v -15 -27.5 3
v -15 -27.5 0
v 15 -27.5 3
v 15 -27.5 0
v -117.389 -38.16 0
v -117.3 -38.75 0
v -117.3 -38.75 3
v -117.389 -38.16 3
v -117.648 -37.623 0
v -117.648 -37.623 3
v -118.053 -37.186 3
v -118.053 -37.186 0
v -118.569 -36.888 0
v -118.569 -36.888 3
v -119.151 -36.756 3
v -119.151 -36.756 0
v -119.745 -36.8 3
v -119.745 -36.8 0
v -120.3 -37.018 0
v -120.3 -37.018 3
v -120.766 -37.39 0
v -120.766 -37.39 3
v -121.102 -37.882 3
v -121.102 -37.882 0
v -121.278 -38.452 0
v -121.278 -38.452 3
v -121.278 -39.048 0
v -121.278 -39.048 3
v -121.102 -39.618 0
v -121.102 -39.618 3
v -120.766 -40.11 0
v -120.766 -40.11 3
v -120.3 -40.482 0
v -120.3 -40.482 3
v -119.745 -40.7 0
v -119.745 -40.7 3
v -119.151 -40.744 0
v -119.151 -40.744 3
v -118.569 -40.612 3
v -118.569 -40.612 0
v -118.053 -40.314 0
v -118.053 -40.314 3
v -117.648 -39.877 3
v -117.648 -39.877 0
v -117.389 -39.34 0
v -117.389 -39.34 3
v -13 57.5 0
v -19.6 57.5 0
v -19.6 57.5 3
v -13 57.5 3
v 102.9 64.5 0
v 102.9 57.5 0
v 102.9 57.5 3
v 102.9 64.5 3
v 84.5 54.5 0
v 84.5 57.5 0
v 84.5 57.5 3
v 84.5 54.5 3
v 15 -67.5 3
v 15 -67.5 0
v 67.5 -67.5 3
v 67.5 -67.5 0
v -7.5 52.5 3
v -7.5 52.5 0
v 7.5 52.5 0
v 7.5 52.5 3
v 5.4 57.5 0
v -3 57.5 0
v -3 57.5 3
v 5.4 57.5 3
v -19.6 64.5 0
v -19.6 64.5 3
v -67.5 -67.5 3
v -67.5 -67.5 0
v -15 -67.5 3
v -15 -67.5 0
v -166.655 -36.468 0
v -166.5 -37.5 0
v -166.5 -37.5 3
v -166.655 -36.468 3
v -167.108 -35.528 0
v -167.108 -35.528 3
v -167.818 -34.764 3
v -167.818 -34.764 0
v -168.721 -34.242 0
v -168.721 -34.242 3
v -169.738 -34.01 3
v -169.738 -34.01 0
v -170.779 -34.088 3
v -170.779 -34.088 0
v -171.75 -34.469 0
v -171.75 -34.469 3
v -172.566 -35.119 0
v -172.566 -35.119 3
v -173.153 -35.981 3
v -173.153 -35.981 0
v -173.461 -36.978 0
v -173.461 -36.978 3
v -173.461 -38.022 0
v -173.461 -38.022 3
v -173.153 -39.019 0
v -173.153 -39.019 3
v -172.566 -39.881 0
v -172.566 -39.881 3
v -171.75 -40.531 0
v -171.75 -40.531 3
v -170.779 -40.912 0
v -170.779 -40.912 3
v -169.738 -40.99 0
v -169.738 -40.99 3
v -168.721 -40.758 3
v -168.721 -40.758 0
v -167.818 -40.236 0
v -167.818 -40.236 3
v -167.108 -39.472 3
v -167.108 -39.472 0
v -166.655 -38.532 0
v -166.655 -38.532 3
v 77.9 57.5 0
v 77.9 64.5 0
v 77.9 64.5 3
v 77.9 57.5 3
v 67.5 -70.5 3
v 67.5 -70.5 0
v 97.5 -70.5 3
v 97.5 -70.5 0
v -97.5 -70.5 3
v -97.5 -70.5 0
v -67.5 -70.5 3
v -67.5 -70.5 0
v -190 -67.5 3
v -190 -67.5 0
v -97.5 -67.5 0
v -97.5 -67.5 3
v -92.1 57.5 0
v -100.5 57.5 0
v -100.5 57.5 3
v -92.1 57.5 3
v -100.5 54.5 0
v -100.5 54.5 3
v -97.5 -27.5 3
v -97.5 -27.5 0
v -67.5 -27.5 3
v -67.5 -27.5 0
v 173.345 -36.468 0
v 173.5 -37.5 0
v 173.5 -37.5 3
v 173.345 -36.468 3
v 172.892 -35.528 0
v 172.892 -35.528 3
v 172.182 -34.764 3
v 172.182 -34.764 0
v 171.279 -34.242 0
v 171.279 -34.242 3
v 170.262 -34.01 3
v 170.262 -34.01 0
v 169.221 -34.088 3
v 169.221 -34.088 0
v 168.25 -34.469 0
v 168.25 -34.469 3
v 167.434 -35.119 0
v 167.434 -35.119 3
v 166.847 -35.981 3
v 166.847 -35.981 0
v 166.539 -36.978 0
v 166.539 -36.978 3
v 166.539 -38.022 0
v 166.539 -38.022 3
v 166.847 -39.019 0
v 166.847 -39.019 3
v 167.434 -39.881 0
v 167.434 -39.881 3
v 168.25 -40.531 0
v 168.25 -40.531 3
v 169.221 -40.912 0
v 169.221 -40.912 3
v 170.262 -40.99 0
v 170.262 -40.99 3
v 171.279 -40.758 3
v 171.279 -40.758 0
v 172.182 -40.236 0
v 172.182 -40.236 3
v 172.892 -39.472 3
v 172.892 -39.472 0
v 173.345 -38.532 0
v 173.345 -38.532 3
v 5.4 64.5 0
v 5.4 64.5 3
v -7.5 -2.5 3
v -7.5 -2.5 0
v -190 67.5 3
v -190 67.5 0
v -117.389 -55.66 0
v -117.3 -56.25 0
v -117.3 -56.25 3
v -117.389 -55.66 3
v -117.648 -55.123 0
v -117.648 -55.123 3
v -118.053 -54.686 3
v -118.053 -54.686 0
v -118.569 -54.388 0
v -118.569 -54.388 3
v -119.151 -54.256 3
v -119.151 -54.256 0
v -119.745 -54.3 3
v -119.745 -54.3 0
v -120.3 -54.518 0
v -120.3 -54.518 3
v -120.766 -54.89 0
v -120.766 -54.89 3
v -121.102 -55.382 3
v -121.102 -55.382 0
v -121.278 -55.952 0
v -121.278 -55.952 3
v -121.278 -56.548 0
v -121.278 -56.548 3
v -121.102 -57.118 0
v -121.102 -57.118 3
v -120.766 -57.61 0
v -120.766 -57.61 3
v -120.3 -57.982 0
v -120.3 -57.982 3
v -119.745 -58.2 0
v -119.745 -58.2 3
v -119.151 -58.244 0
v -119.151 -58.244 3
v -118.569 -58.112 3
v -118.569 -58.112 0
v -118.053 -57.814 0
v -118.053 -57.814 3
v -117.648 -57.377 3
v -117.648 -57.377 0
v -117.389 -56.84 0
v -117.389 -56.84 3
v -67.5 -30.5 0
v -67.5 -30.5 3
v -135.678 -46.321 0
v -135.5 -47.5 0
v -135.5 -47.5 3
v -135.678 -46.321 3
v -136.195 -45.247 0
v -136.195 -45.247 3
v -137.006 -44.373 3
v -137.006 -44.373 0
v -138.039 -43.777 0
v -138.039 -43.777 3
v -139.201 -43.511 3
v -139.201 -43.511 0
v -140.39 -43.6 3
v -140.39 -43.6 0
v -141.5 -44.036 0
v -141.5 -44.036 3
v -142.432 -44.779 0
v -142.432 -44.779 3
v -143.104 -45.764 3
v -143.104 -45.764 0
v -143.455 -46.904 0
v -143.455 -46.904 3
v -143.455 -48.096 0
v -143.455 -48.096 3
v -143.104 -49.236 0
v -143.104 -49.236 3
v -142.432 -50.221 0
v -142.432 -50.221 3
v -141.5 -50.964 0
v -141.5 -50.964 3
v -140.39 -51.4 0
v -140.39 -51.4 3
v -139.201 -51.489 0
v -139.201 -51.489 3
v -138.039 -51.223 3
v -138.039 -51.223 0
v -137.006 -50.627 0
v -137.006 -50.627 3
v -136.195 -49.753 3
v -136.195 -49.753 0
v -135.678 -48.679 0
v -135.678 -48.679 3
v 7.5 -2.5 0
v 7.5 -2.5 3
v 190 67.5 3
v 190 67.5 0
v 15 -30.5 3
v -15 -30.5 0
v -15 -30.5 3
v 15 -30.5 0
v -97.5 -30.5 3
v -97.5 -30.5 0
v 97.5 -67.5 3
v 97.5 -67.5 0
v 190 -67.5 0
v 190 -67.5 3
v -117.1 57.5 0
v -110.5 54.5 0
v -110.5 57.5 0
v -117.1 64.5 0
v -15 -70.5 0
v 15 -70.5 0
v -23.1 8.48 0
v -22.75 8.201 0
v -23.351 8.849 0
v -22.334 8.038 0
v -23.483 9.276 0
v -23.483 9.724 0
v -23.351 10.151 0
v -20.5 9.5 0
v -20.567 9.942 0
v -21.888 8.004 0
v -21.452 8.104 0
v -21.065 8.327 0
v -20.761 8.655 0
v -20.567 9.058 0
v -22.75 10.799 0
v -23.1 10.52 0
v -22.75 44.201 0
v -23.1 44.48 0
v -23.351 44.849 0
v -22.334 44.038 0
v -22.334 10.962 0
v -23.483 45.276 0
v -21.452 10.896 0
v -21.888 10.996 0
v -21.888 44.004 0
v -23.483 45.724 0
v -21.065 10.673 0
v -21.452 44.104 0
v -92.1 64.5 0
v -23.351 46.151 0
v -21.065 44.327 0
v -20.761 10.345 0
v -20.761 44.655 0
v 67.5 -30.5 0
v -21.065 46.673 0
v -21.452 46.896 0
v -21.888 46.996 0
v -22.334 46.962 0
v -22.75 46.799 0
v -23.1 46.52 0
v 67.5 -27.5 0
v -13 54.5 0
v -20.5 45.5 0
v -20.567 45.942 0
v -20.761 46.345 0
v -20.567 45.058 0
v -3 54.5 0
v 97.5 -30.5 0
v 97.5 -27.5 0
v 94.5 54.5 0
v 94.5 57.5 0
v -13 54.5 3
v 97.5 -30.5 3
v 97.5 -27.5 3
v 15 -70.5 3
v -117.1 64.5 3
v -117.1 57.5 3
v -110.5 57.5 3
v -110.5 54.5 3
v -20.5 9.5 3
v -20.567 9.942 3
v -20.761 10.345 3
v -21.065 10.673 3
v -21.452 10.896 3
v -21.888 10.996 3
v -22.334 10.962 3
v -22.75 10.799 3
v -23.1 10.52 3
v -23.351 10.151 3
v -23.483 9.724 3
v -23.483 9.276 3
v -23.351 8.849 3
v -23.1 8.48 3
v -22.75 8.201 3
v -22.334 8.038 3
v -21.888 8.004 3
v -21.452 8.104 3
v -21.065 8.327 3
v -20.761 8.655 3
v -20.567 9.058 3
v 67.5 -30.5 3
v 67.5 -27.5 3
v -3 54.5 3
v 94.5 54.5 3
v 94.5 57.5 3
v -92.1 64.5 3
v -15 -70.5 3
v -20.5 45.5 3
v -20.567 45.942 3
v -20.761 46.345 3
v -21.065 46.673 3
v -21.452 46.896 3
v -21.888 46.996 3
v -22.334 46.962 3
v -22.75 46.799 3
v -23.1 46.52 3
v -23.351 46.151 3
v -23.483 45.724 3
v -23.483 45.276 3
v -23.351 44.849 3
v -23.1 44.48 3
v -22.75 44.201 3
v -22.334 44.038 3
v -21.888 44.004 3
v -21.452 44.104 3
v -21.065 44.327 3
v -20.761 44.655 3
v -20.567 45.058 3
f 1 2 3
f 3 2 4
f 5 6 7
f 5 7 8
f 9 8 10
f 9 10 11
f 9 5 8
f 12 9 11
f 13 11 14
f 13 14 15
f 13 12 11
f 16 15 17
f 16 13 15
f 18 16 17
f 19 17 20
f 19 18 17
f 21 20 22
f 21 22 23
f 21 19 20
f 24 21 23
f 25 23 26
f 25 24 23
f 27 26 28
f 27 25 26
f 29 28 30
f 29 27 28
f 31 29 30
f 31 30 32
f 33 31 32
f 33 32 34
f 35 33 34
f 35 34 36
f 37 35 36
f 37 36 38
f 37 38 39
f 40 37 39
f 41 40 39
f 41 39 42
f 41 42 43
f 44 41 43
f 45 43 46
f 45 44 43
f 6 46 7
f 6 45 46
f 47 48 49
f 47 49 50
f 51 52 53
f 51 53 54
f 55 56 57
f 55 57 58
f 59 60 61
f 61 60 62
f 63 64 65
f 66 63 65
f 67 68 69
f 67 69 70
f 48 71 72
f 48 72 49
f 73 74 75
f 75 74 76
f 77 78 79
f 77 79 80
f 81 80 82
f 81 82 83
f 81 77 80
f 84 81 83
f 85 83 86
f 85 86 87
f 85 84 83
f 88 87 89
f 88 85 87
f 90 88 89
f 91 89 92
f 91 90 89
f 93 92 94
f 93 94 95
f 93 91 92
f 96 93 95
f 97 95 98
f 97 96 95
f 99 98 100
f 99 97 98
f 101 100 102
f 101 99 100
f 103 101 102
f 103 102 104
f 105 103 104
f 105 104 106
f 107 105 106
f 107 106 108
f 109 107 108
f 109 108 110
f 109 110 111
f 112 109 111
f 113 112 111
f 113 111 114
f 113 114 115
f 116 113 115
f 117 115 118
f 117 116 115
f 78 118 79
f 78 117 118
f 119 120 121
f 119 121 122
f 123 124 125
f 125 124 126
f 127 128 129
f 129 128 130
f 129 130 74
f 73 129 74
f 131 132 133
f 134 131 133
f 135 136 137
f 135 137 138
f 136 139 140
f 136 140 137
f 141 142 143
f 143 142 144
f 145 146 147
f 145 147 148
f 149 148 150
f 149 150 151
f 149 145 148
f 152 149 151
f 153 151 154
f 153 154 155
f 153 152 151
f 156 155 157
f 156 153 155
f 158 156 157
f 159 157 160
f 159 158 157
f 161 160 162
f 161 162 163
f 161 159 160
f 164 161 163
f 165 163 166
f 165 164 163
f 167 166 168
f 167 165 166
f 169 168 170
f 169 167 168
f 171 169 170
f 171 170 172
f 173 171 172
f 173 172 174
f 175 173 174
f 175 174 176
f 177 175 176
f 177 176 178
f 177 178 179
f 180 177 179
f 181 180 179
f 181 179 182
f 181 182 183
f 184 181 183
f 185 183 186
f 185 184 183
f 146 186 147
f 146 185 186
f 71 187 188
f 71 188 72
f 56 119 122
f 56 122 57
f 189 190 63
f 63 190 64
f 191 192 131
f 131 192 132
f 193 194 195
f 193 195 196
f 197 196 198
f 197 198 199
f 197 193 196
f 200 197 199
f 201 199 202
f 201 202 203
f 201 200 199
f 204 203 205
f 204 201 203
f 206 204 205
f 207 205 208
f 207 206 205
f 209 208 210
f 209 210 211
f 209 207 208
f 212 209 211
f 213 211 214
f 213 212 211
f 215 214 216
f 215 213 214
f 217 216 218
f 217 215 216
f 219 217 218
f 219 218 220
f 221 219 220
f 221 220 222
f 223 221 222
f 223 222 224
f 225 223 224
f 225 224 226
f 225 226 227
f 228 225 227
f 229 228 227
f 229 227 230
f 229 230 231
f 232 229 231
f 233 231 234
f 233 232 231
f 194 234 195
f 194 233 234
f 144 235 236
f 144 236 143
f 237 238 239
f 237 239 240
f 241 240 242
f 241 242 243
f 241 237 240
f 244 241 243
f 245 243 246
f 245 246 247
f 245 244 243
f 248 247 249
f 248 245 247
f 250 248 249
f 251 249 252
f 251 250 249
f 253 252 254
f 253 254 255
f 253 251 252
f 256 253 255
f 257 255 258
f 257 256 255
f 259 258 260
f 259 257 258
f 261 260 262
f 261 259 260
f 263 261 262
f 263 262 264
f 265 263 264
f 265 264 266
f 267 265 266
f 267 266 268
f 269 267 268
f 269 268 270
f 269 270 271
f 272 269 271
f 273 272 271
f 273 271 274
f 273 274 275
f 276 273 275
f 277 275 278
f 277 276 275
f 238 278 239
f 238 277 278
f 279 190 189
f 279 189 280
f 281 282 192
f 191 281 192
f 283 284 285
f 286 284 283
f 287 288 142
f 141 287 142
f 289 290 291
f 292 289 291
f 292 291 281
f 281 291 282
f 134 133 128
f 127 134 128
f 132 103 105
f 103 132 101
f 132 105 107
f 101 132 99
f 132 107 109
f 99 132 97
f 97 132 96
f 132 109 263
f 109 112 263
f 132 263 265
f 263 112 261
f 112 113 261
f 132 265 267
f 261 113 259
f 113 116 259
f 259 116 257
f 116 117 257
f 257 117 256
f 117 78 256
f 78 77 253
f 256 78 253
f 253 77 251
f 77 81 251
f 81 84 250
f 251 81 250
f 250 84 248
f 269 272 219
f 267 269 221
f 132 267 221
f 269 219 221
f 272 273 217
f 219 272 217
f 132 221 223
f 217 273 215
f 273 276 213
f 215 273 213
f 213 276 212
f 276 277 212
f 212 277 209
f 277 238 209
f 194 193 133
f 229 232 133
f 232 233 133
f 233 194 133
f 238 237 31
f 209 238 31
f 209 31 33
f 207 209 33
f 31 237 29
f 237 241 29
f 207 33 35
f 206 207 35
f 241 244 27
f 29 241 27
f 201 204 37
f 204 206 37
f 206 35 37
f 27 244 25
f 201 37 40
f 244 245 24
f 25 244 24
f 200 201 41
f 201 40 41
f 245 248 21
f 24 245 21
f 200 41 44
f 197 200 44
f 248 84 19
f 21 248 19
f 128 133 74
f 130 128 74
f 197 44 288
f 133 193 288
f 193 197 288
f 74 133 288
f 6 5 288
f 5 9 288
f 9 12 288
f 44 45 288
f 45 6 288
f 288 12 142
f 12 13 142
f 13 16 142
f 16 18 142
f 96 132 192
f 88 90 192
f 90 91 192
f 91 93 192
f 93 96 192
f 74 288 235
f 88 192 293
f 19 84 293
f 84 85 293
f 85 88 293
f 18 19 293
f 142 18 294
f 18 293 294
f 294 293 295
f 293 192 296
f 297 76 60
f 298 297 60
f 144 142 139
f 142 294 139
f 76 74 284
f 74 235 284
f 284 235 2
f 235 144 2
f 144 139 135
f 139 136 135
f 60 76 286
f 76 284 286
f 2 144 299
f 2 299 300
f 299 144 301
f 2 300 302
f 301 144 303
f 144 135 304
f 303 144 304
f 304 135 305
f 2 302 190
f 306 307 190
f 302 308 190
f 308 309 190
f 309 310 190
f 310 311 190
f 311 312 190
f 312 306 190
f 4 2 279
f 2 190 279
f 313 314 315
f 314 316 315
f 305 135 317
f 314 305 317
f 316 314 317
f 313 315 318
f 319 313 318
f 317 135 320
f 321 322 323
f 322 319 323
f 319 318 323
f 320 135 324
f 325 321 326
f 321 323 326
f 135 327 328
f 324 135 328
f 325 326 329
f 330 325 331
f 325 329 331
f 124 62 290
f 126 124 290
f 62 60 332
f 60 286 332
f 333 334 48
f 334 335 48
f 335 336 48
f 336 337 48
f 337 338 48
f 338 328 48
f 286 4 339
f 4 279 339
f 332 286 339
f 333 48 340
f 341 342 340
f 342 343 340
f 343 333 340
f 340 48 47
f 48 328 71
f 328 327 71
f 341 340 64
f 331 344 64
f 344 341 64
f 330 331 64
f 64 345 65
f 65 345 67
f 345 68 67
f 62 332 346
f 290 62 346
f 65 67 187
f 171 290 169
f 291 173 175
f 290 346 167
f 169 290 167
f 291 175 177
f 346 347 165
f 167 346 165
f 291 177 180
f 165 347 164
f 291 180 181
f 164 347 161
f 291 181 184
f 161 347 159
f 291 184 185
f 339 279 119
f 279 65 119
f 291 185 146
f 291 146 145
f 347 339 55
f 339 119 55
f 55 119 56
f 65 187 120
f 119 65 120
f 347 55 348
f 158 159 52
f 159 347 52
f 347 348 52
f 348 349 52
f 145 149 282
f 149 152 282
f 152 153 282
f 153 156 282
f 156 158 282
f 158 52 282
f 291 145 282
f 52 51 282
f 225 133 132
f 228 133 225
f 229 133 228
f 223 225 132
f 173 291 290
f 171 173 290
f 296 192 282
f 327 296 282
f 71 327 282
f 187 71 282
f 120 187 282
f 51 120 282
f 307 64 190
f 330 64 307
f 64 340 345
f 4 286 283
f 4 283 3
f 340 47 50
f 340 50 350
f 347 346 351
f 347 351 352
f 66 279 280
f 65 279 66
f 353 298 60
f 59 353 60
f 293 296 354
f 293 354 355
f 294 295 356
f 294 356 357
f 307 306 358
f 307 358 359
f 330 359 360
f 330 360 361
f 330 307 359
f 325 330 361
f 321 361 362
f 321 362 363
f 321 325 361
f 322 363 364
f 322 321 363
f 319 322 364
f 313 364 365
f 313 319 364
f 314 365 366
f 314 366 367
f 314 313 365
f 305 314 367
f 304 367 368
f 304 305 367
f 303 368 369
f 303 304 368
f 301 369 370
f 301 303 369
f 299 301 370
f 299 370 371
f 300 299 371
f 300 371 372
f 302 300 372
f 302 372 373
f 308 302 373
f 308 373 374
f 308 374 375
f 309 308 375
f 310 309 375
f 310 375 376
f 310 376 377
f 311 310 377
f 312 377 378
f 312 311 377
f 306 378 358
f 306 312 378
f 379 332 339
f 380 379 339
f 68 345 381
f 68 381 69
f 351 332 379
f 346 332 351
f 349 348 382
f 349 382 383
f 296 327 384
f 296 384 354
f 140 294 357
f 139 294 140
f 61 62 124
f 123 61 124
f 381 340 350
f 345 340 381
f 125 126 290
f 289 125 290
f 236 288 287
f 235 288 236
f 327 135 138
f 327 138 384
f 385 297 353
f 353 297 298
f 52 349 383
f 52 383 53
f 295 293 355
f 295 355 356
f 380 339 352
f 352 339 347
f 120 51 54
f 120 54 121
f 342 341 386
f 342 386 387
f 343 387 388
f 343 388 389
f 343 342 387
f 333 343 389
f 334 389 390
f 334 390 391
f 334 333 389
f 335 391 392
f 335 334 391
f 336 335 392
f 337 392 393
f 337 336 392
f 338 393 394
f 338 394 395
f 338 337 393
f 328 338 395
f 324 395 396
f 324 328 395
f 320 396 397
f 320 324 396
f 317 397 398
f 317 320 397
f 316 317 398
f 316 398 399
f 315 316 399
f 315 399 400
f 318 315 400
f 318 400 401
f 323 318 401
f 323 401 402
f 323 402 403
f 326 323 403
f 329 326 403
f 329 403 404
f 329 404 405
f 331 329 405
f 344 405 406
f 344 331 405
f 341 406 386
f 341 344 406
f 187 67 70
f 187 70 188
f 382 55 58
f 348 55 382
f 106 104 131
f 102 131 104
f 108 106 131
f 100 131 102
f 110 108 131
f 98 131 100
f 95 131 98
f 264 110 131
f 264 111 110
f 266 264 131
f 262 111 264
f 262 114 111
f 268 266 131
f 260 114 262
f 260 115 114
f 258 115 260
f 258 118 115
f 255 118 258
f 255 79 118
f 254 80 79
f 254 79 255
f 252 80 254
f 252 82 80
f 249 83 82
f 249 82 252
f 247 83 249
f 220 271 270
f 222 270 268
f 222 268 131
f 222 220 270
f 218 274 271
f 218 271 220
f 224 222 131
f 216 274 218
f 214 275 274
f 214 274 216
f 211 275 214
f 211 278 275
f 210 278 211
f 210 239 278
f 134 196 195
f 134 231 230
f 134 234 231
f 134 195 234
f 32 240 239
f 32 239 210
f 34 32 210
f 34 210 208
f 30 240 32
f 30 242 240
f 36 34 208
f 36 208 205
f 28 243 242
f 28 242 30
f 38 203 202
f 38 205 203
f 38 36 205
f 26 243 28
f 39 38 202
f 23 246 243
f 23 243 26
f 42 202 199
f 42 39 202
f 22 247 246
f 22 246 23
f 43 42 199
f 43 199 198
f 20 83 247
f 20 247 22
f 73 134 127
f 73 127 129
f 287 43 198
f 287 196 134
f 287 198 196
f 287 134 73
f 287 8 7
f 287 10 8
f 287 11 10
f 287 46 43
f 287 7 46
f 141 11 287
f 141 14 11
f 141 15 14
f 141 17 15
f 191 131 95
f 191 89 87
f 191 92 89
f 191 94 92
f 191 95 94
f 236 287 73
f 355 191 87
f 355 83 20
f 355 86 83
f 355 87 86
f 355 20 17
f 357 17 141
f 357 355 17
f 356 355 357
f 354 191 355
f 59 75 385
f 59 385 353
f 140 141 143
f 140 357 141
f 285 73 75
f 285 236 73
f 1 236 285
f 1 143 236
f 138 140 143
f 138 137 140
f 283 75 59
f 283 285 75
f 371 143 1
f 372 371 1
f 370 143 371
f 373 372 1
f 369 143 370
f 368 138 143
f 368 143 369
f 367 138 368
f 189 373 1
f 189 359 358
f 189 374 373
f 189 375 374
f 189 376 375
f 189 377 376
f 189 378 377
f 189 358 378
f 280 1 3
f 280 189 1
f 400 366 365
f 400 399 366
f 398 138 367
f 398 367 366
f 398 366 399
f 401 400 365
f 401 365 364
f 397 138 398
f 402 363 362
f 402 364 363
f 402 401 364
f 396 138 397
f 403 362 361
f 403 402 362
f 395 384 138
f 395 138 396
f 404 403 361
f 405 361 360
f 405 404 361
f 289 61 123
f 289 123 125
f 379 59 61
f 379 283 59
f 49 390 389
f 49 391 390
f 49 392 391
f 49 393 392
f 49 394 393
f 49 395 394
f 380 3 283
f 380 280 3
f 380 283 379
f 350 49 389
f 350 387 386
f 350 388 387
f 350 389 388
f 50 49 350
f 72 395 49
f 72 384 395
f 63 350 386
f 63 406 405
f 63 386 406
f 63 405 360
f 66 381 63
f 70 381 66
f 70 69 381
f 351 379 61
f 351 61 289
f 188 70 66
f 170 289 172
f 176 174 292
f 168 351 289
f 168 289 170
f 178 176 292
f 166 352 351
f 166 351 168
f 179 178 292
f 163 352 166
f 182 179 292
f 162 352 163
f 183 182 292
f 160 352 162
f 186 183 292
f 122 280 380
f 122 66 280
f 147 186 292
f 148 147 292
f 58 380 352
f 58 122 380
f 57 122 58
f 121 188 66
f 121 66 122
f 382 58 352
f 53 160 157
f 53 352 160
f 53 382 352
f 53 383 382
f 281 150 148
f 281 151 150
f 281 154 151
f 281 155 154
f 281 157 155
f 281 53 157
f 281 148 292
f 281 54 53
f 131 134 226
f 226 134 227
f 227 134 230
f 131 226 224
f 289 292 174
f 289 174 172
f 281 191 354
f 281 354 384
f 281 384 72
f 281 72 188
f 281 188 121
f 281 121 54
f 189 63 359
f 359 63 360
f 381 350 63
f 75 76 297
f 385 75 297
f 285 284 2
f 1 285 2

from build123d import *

# Parameters (mm, degrees)
CROQUIS1_R              = 1.5
CROQUIS1_R_2            = 3.5
CROQUIS1_R_3            = 4
CROQUIS1_R_4            = 2
CROQUIS1_W              = 30
CROQUIS1_H              = 3
CROQUIS1_W_2            = 15
CROQUIS1_H_2            = 55
SALIENTE_EXTRUIR4_DEPTH = 3


with BuildPart() as part:
    # Croquis1 → Saliente-Extruir4 (new body)
    with BuildSketch(Plane.XY):
        Polygon((-190, -67.5), (-97.5, -67.5), (-97.5, -70.5), (-67.5, -70.5), (-67.5, -67.5), (-15, -67.5), (-15, -70.5), (15, -70.5), (15, -67.5), (67.5, -67.5), (67.5, -70.5), (97.5, -70.5), (97.5, -67.5), (190, -67.5), (190, 67.5), (-190, 67.5), align=None)
        with Locations((-22, 45.5)):
            Circle(CROQUIS1_R, mode=Mode.SUBTRACT)
        with Locations((-22, 9.5)):
            Circle(CROQUIS1_R, mode=Mode.SUBTRACT)
        with Locations((-170, -37.5)):
            Circle(CROQUIS1_R_2, mode=Mode.SUBTRACT)
        with Locations((-139.5, -47.5)):
            Circle(CROQUIS1_R_3, mode=Mode.SUBTRACT)
        with Locations((-119.3, -38.75)):
            Circle(CROQUIS1_R_4, mode=Mode.SUBTRACT)
        with Locations((-119.3, -56.25)):
            Circle(CROQUIS1_R_4, mode=Mode.SUBTRACT)
        with Locations((170, -37.5)):
            Circle(CROQUIS1_R_2, mode=Mode.SUBTRACT)
        with Locations((82.5, -29)):
            Rectangle(CROQUIS1_W, CROQUIS1_H, mode=Mode.SUBTRACT)
        with Locations((0, -29)):
            Rectangle(CROQUIS1_W, CROQUIS1_H, mode=Mode.SUBTRACT)
        with Locations((-82.5, -29)):
            Rectangle(CROQUIS1_W, CROQUIS1_H, mode=Mode.SUBTRACT)
        Polygon((-19.6, 64.5), (-19.6, 57.5), (-13, 57.5), (-13, 54.5), (-3, 54.5), (-3, 57.5), (5.4, 57.5), (5.4, 64.5), align=None, mode=Mode.SUBTRACT)
        Polygon((-117.1, 64.5), (-117.1, 57.5), (-110.5, 57.5), (-110.5, 54.5), (-100.5, 54.5), (-100.5, 57.5), (-92.1, 57.5), (-92.1, 64.5), align=None, mode=Mode.SUBTRACT)
        Polygon((77.9, 64.5), (77.9, 57.5), (84.5, 57.5), (84.5, 54.5), (94.5, 54.5), (94.5, 57.5), (102.9, 57.5), (102.9, 64.5), align=None, mode=Mode.SUBTRACT)
        with Locations((0, 25)):
            Rectangle(CROQUIS1_W_2, CROQUIS1_H_2, mode=Mode.SUBTRACT)
    extrude(amount=SALIENTE_EXTRUIR4_DEPTH)


solid = part.part
